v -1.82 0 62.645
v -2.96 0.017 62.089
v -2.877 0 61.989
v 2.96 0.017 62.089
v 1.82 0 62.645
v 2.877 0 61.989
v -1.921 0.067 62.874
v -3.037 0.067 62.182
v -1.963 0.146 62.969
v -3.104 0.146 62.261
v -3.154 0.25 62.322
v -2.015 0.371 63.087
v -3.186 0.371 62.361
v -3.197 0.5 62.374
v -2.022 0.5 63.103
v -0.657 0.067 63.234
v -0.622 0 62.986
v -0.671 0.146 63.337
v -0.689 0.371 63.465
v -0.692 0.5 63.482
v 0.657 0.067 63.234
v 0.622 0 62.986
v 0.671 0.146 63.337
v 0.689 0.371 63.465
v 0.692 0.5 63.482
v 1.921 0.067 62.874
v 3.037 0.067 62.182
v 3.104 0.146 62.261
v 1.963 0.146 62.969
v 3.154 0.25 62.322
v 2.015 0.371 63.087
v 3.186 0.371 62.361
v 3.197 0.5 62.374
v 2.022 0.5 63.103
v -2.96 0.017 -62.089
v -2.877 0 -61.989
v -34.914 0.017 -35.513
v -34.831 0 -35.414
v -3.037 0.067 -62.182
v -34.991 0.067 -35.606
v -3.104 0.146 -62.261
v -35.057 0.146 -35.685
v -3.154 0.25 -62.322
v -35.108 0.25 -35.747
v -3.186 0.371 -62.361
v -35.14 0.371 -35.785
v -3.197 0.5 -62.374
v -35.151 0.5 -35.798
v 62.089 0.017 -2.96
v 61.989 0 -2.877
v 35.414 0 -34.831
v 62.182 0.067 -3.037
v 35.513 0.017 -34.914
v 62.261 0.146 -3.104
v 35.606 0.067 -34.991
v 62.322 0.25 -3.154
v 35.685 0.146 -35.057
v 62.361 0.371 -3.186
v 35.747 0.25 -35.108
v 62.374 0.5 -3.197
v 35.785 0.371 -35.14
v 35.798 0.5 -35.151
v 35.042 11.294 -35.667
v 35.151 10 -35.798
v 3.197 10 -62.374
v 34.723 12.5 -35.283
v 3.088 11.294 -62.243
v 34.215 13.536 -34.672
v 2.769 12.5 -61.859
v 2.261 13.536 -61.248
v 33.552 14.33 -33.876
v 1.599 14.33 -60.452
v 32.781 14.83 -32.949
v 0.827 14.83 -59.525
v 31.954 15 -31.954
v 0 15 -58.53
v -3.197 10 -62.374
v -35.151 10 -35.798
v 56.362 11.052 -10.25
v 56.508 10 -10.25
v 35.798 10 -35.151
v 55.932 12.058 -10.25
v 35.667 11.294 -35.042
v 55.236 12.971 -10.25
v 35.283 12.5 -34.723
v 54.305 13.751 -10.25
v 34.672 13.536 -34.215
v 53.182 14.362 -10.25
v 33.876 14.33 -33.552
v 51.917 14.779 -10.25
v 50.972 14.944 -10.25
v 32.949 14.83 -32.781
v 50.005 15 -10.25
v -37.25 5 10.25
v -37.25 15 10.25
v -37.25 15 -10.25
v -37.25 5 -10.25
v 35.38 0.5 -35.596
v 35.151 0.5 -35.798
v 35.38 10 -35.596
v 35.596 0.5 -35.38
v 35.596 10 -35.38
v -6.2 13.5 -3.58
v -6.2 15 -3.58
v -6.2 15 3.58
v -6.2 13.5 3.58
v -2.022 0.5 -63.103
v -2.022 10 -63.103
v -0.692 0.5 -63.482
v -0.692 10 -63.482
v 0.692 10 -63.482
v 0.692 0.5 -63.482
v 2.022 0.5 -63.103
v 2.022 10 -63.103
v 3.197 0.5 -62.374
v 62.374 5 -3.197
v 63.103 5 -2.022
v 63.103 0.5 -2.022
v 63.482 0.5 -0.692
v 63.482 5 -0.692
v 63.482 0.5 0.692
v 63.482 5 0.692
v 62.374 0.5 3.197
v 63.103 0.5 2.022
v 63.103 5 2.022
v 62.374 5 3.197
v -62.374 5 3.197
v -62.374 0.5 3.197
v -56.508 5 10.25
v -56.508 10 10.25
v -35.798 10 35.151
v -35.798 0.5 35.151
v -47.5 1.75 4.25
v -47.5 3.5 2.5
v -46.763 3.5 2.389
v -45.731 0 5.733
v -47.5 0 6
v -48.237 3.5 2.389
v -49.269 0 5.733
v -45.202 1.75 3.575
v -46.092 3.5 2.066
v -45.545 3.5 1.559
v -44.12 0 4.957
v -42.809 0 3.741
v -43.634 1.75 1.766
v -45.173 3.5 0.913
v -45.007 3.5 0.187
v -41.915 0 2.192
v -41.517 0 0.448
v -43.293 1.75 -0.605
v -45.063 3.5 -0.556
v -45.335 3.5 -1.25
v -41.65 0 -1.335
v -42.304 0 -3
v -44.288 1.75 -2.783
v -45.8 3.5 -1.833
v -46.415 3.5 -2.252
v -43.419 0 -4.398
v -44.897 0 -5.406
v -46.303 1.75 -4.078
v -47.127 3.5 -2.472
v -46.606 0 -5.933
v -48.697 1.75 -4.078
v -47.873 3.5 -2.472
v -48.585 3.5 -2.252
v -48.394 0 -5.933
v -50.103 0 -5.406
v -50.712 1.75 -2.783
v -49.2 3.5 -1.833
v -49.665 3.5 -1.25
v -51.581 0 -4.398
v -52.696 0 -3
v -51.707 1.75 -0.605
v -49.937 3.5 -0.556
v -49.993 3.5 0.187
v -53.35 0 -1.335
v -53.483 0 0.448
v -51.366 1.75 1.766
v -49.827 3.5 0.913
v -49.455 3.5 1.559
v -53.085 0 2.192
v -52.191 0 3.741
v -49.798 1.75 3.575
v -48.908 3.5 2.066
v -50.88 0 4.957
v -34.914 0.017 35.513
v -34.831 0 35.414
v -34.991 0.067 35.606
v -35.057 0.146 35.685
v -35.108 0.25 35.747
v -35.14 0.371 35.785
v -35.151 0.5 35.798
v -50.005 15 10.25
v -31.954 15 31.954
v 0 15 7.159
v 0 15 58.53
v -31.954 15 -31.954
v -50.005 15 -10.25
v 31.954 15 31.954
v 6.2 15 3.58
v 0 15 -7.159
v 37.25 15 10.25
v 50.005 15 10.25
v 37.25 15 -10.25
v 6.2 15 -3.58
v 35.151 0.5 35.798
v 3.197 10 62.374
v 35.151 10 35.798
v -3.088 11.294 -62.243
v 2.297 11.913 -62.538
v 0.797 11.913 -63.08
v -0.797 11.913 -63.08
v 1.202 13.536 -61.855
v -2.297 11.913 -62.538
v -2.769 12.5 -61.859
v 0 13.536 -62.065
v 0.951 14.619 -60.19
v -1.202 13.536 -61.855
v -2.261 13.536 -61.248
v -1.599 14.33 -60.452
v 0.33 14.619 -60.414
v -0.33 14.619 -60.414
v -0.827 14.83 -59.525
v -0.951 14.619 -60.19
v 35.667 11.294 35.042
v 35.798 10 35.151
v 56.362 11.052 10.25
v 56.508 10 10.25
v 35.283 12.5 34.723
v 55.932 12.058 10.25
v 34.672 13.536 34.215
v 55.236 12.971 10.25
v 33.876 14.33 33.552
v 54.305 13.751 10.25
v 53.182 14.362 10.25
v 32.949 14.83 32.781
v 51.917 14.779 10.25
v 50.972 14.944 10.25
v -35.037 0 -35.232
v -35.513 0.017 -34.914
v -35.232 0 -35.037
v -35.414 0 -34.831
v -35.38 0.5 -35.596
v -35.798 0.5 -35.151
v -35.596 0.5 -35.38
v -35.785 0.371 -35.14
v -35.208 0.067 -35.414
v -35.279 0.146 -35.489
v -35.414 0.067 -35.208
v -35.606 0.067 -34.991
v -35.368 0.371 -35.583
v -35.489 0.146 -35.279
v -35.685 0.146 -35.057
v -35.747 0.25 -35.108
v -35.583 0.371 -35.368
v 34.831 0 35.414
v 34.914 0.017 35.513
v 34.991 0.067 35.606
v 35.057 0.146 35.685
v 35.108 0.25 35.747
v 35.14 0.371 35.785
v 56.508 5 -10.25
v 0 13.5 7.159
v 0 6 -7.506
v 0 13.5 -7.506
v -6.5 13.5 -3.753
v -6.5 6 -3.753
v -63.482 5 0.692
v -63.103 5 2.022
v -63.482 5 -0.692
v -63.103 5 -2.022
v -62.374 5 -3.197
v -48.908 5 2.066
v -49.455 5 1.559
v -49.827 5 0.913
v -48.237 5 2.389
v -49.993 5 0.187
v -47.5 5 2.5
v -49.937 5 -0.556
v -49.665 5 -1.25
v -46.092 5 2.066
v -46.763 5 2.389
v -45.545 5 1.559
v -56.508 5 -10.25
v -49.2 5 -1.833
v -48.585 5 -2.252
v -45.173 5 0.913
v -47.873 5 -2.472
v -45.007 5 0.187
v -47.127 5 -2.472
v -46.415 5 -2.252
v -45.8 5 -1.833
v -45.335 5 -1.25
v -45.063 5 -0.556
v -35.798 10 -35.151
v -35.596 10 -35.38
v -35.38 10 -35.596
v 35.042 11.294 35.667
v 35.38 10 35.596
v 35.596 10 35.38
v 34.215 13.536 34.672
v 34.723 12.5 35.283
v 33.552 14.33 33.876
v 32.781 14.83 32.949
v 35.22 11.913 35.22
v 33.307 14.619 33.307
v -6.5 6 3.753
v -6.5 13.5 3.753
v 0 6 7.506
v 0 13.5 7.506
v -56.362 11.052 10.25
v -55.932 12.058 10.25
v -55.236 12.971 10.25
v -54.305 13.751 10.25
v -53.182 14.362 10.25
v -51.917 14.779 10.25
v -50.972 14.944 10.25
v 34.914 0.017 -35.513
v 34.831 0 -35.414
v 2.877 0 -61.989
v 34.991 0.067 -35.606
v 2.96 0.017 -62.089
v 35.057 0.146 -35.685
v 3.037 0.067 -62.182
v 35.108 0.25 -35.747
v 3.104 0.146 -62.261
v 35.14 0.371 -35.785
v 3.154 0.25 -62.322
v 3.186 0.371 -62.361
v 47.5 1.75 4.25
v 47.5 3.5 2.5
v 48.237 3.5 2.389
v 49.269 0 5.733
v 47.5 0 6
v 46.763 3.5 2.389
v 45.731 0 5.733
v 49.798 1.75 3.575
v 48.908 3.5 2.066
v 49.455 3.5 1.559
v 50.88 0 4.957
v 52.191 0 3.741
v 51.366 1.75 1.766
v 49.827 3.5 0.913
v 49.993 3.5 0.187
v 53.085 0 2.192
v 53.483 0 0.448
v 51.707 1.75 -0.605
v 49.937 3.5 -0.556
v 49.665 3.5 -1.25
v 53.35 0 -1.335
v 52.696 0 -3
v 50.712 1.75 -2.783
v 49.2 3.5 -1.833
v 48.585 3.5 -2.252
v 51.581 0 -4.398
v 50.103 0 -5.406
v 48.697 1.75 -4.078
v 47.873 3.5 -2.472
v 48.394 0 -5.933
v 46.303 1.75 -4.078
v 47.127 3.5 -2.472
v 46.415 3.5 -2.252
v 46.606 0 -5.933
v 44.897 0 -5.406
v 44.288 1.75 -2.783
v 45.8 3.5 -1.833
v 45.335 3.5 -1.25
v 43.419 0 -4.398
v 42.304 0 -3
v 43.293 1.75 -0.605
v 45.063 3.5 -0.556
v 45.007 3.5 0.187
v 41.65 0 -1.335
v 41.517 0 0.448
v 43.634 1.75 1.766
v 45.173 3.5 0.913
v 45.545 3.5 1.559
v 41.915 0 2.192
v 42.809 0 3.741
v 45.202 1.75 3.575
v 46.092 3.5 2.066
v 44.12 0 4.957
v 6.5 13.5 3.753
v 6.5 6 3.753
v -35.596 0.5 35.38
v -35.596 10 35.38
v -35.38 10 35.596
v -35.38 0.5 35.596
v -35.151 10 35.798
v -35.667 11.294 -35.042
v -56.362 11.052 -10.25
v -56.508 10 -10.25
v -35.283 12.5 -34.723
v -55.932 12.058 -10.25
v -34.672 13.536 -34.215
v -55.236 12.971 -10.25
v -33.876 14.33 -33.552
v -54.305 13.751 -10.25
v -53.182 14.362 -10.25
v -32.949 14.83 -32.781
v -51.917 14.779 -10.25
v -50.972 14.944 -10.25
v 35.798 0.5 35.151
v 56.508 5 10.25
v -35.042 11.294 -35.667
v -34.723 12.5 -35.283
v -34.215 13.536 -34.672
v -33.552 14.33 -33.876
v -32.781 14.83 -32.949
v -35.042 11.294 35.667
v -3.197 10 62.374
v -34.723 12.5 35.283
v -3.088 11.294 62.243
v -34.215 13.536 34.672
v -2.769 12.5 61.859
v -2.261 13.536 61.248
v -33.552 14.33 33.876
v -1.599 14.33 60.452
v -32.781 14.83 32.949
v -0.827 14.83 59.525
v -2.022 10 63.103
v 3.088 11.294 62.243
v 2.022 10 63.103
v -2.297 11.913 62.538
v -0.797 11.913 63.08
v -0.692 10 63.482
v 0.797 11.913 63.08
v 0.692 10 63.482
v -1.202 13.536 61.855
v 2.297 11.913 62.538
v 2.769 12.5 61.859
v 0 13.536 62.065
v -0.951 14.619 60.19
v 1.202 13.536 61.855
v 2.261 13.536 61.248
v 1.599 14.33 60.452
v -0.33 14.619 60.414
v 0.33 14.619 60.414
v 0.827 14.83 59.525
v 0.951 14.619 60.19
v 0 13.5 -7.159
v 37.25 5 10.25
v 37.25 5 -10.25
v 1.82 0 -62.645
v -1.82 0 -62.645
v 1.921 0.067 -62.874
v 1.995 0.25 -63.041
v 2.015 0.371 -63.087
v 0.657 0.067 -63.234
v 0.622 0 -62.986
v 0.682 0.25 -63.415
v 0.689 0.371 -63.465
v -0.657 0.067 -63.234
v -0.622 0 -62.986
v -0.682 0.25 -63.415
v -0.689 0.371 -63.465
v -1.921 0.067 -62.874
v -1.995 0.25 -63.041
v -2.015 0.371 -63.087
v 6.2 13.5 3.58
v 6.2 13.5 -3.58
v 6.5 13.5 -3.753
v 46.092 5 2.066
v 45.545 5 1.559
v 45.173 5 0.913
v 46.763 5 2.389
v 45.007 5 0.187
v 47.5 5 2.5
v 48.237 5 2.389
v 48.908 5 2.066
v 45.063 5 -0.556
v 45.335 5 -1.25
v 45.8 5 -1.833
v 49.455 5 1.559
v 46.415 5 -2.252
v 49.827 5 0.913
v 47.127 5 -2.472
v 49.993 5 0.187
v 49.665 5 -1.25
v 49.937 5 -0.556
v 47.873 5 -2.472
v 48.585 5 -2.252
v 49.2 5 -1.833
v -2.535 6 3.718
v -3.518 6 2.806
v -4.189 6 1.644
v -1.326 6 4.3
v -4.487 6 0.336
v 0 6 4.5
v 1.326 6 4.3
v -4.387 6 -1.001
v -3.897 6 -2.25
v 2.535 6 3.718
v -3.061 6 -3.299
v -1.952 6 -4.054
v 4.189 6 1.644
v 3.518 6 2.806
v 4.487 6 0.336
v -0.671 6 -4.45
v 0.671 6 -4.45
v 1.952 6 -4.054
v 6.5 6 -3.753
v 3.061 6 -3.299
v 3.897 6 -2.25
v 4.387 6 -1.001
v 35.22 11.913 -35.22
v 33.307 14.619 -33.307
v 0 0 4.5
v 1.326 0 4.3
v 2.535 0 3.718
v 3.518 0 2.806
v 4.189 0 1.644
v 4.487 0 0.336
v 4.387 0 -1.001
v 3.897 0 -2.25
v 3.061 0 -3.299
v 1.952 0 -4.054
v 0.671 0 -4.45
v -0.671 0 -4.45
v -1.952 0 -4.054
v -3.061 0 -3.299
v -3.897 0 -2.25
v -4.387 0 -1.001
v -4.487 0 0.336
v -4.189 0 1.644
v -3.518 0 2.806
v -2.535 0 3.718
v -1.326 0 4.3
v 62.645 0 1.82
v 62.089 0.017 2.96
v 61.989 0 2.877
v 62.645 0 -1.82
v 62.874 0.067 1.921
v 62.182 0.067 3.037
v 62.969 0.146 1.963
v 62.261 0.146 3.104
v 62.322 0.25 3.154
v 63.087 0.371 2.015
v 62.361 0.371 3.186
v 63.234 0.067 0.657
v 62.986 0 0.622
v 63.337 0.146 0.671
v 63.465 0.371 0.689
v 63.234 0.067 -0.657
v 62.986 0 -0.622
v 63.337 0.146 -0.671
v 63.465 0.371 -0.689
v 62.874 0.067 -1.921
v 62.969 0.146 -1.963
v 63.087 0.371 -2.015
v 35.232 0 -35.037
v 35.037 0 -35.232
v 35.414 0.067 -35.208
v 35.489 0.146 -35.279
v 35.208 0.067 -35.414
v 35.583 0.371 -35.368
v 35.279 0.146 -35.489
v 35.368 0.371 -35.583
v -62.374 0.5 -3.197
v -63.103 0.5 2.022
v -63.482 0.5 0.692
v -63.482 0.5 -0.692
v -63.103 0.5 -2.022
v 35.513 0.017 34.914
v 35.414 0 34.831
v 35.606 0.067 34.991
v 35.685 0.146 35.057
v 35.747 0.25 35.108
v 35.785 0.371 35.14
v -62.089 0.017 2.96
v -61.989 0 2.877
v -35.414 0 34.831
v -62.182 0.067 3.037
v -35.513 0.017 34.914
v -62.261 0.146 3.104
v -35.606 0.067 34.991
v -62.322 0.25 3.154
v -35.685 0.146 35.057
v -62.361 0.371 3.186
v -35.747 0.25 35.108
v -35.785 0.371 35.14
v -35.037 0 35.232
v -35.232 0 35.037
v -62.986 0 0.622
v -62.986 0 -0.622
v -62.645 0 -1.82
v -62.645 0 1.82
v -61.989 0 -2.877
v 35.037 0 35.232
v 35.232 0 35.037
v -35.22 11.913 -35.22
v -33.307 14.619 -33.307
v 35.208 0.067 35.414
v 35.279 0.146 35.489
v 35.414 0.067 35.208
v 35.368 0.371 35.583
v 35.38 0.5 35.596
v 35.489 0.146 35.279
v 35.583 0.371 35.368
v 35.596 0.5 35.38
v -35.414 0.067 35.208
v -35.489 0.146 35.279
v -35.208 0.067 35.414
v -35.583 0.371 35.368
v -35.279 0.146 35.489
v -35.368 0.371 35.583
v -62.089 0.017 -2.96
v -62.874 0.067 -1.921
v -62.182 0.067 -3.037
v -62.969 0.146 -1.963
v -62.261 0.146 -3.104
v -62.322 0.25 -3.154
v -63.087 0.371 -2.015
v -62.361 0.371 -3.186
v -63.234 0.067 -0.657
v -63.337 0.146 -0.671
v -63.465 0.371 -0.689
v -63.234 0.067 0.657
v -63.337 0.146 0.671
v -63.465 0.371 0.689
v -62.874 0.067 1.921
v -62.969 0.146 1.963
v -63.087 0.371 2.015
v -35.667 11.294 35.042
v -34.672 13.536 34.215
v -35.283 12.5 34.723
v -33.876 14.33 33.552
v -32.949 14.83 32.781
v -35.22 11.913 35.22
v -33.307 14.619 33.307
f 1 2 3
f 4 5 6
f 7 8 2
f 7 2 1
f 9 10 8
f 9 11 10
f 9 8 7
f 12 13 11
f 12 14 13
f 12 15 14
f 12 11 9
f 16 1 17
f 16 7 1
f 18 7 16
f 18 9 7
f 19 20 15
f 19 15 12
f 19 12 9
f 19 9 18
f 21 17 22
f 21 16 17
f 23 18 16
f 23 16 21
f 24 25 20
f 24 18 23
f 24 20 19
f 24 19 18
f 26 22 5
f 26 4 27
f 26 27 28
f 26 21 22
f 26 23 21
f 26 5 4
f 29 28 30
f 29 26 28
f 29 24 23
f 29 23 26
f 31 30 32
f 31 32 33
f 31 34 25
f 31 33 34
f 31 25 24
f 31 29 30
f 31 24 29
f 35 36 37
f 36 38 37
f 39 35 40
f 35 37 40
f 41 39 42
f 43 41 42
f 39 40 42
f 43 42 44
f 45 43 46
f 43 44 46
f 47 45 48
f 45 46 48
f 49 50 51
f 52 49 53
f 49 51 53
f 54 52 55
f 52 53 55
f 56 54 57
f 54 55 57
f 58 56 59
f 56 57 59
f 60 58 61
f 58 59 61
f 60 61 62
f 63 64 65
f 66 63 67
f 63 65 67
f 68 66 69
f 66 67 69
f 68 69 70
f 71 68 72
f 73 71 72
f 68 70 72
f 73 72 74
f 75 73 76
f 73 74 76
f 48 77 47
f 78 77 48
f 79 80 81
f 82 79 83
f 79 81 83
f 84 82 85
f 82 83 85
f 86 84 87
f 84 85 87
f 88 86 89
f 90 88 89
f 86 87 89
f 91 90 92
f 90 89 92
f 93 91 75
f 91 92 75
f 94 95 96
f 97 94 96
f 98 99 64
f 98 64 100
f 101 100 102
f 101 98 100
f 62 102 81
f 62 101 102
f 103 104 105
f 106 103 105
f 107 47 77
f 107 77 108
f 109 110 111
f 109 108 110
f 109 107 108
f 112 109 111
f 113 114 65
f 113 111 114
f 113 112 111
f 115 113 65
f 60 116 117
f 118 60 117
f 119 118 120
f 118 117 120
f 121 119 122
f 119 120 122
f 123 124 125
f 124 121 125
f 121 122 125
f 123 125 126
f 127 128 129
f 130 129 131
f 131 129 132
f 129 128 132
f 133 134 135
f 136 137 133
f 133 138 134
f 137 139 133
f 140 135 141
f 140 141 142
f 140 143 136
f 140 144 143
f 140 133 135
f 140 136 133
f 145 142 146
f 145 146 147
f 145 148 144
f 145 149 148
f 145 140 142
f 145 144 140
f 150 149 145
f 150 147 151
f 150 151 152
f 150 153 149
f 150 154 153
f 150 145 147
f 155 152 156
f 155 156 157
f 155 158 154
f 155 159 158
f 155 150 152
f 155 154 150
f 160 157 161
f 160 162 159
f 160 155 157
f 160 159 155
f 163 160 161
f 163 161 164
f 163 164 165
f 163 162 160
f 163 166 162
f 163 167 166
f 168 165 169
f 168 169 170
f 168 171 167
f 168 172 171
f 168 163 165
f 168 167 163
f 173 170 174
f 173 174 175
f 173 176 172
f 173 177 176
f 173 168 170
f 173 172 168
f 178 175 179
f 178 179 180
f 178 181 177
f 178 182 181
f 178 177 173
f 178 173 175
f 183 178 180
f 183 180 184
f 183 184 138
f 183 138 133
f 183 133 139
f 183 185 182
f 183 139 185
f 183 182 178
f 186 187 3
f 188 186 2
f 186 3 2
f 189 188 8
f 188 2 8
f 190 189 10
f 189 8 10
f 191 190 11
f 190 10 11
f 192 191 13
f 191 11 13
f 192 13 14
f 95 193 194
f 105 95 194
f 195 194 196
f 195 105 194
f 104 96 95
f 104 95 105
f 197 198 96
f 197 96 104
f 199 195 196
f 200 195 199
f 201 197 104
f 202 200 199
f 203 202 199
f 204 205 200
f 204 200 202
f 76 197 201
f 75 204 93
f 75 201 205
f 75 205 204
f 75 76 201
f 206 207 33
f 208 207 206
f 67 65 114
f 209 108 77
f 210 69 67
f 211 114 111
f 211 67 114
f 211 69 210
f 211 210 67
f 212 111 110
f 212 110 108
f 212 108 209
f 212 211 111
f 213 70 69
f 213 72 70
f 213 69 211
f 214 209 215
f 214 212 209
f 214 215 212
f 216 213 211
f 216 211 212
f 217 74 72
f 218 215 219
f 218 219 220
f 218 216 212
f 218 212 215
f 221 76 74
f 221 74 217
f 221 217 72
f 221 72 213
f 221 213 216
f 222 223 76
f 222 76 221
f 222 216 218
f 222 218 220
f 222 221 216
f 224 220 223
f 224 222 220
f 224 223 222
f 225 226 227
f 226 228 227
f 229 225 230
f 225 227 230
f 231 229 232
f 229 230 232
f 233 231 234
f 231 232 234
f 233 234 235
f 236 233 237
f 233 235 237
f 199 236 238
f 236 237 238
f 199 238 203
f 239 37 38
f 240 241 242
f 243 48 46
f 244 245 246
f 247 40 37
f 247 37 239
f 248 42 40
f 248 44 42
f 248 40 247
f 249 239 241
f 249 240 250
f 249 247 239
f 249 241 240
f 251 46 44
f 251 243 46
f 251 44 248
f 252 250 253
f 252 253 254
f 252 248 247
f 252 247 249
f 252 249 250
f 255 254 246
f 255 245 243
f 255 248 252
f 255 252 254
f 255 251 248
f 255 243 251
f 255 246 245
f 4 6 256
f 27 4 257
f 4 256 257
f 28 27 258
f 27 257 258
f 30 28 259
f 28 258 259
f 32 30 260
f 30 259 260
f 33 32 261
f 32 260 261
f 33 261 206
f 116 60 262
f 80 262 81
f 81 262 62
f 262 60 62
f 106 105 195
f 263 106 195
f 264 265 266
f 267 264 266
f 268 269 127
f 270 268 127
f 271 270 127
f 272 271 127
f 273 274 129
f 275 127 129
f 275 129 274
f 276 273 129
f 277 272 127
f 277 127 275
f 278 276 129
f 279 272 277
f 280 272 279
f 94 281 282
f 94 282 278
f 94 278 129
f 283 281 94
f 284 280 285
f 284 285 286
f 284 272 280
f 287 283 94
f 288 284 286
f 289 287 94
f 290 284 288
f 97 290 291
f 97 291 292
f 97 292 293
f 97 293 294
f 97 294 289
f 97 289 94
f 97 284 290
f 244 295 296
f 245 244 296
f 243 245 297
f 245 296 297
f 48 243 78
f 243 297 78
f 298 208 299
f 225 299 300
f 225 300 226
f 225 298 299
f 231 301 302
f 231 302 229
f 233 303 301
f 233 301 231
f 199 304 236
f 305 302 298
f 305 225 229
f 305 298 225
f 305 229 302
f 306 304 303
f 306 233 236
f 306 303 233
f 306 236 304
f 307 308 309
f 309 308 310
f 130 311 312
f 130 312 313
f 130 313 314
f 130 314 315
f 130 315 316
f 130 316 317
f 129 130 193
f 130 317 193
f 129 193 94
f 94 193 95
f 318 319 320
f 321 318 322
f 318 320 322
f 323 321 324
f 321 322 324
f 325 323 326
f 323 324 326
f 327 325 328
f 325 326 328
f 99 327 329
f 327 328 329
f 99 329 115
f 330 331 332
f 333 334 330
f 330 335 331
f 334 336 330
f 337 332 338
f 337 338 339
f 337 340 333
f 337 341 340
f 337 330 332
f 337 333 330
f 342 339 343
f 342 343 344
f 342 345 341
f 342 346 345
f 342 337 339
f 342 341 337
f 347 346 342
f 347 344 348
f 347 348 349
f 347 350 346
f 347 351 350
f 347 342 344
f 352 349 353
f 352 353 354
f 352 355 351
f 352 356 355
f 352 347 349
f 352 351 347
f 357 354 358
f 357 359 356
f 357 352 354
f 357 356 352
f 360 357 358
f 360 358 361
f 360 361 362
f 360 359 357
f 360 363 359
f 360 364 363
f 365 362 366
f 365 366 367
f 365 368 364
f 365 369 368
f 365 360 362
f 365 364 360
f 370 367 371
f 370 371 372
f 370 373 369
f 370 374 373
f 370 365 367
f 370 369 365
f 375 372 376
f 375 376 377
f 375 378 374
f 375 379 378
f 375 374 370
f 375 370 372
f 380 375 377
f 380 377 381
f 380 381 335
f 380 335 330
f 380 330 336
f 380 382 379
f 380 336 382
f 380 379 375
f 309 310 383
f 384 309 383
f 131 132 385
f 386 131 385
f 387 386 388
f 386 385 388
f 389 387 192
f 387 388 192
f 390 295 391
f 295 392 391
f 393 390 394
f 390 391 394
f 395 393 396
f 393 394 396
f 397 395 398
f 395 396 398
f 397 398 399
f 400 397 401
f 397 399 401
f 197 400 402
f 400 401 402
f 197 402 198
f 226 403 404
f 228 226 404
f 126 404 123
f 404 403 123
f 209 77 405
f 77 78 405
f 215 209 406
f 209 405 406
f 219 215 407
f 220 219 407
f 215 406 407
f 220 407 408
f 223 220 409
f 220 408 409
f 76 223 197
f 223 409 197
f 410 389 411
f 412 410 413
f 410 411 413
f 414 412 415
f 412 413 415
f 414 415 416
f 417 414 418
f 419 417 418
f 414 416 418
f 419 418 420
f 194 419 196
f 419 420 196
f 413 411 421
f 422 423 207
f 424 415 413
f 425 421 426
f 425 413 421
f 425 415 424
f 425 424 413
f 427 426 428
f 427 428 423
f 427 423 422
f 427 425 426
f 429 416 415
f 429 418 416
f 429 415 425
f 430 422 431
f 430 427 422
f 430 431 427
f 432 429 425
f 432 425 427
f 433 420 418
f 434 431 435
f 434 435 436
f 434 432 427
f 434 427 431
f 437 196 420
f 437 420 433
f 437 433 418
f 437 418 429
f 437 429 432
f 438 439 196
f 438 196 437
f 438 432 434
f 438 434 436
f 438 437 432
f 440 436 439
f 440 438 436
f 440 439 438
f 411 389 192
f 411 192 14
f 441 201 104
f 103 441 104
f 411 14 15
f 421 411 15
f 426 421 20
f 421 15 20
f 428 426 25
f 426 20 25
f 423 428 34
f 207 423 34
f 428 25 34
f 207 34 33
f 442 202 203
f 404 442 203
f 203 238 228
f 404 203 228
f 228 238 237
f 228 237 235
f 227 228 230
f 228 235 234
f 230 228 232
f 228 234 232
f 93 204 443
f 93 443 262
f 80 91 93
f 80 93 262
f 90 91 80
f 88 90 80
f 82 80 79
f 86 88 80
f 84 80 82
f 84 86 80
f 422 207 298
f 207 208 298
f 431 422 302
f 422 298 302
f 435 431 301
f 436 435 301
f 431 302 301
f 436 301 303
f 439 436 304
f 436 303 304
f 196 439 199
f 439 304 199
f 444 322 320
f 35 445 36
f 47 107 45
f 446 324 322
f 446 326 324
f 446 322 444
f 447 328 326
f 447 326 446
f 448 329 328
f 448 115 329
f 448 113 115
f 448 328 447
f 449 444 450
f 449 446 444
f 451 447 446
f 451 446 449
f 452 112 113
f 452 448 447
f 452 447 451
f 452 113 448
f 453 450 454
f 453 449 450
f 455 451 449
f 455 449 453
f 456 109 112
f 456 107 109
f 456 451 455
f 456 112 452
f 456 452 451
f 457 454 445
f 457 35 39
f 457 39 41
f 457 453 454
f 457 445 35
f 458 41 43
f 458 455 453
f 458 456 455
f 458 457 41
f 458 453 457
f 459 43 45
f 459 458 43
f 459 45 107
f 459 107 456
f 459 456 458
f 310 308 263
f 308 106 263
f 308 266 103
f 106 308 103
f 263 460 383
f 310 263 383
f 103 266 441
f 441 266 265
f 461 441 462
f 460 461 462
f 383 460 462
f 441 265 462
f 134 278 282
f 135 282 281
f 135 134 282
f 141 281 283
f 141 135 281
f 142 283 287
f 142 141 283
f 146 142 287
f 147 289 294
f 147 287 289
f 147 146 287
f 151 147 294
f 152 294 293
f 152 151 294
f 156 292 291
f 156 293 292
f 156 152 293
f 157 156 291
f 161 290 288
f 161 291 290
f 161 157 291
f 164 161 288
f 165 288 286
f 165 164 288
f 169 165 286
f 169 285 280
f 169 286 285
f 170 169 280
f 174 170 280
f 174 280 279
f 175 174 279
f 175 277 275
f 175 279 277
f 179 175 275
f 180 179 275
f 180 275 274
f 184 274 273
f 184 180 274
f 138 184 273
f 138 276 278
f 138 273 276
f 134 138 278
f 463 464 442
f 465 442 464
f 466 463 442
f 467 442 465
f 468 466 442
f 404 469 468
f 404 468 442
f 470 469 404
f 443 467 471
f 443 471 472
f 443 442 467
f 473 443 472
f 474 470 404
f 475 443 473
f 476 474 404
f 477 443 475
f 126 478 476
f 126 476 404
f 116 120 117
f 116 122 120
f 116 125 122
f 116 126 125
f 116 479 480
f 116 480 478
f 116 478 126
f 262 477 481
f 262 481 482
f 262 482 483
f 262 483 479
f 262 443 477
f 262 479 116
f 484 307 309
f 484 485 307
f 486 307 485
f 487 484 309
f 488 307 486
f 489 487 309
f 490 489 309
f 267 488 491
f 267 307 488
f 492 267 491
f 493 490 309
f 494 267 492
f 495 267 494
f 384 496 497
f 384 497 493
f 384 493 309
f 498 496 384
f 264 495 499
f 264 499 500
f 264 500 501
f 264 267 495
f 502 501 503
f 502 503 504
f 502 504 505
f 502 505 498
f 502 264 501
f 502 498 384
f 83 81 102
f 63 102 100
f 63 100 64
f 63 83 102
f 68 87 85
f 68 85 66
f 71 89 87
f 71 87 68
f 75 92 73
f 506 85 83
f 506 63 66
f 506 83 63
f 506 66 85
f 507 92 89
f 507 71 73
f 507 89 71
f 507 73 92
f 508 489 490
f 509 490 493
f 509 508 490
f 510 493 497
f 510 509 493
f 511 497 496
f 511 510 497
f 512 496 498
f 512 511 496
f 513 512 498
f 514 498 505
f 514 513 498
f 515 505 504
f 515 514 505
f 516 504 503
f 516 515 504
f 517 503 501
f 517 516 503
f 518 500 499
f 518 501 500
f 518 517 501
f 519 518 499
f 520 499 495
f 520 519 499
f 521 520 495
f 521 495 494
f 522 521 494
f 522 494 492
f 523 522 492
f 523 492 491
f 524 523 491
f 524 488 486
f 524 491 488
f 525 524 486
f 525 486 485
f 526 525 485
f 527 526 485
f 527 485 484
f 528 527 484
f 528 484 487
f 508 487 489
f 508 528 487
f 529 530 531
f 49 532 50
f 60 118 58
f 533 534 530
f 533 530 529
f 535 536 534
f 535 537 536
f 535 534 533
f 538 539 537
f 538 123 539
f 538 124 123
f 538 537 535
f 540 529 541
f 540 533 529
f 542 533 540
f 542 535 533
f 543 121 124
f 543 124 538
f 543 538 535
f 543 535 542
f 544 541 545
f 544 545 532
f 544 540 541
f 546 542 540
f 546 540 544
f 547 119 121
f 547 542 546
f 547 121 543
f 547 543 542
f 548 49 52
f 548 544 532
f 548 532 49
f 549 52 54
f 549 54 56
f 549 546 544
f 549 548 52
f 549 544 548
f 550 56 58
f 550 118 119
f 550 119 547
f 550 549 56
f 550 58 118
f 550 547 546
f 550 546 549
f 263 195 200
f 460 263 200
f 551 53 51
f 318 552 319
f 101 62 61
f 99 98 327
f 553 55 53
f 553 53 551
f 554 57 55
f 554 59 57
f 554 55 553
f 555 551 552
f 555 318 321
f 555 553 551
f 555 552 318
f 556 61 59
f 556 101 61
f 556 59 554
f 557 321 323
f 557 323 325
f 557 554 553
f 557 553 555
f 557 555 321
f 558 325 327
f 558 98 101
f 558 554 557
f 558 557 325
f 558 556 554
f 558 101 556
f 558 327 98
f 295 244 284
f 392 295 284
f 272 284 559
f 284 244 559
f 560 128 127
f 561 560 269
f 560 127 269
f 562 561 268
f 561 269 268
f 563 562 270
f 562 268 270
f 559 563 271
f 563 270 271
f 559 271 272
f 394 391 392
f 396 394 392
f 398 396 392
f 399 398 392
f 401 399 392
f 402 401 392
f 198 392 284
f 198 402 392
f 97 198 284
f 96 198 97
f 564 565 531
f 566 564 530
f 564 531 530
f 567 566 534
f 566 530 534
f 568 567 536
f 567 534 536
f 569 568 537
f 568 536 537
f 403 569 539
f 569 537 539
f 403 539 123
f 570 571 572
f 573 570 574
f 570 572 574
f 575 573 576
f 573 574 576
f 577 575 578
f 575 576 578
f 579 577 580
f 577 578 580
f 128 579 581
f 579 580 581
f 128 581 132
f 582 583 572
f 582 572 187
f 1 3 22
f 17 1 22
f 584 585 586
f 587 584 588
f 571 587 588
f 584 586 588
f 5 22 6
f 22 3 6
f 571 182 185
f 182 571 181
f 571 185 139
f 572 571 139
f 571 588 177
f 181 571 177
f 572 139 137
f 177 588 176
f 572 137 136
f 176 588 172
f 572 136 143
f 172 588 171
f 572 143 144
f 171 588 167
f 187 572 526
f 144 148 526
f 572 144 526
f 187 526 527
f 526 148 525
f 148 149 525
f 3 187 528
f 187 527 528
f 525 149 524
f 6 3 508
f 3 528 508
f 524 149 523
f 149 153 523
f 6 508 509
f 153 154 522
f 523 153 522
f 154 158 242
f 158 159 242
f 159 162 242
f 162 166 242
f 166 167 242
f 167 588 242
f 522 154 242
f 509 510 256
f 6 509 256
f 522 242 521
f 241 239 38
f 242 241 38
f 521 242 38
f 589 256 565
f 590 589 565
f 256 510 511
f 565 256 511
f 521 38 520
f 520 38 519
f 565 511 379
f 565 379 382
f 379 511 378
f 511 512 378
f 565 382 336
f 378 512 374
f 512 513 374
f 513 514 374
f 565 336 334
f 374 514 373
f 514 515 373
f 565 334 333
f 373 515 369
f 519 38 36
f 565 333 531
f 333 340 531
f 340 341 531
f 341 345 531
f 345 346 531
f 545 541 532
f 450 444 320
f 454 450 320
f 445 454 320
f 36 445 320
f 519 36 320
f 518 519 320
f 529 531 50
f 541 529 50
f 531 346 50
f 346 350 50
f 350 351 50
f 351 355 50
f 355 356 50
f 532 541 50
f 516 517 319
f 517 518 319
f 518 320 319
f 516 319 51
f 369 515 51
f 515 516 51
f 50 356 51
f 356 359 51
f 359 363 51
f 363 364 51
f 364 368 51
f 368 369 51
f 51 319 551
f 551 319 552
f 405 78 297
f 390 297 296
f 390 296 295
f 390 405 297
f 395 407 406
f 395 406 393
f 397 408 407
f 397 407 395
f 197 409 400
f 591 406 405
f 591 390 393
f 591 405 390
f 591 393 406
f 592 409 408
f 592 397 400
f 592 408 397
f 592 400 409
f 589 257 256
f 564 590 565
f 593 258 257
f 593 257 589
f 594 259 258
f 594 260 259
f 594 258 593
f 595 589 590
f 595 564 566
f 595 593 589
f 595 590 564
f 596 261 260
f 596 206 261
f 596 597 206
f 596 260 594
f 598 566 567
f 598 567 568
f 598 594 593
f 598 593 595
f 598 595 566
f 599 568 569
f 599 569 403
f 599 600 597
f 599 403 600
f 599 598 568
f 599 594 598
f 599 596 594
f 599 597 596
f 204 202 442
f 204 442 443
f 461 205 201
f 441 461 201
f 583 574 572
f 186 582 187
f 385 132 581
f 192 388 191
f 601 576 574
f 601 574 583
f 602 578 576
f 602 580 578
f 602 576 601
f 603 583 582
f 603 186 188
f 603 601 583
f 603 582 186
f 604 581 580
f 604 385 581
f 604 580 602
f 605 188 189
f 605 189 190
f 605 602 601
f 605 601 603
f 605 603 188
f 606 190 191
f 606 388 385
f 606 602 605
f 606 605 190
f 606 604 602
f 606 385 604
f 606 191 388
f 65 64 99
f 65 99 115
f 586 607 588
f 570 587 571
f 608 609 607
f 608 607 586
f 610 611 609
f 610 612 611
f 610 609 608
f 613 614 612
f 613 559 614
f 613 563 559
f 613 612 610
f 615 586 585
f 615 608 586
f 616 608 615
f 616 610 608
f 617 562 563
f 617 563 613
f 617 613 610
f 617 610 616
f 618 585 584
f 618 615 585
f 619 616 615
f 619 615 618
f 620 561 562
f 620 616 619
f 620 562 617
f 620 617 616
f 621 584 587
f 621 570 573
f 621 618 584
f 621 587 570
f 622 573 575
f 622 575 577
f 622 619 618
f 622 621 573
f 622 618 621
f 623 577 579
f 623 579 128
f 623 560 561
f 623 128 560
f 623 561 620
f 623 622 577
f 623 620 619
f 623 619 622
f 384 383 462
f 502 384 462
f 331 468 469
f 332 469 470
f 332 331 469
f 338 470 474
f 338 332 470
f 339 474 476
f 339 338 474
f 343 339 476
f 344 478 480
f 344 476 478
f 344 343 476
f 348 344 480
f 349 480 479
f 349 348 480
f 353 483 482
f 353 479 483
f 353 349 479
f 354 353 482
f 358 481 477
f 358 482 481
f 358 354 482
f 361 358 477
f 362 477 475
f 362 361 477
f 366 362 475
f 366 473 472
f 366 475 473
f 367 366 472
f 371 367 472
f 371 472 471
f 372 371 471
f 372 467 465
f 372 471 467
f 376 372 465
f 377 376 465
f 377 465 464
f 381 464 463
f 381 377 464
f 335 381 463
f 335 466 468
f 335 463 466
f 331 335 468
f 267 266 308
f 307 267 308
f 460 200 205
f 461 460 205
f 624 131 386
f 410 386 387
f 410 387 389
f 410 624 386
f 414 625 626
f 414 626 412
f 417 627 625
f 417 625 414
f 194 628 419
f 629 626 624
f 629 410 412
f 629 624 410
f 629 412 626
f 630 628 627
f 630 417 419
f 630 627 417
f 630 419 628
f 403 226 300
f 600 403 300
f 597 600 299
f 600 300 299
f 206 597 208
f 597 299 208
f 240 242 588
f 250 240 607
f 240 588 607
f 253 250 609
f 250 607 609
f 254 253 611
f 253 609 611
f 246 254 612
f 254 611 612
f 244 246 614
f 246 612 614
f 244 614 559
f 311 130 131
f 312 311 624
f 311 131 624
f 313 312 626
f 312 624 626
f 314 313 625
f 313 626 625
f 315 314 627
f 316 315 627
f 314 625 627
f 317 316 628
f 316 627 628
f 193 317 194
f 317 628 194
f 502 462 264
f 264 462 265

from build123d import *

# Parameters (mm, degrees)
ESQUISSE1_R             = 4.5
ESQUISSE1_R_2           = 2.5
BOSS_EXTRU_1_DEPTH      = 15
ESQUISSE2_OUTSIDE_W     = 172.858
ESQUISSE2_OUTSIDE_H     = 199.18
ENL_V_MAT_EXTRU_1_DEPTH = 103.80323738
CONG_1_R                = 5
ENL_V_MAT_EXTRU_2_DEPTH = 9
ESQUISSE3_W             = 26.279593634
ESQUISSE3_H             = 20.5
ENL_V_MAT_EXTRU_3_DEPTH = 10
CONG_2_R                = 5
CONG_3_R                = 0.5
ESQUISSE5_R             = 7.505553499
BOSS_EXTRU_2_DEPTH      = 1.5
CHANFREIN1_SIZE         = 3.5


with BuildPart() as part:
    # Esquisse1 → Boss.-Extru.1 (new body)
    with BuildSketch(Plane(origin=(0, 0, 0), x_dir=(1, 0, 0), z_dir=(0, 1, 0))):
        Polygon((-65.032881815, 0), (0, -78.193541284), (65.032881815, 0), (0, 78.193541284), align=None)
        with Locations(Location((0, 0, 0), (0, 0, 270))):
            Circle(ESQUISSE1_R, mode=Mode.SUBTRACT)
        with Locations(Location((-47.5, 0, 0), (0, 0, 270))):
            Circle(ESQUISSE1_R_2, mode=Mode.SUBTRACT)
        with Locations(Location((47.5, 0, 0), (0, 0, 270))):
            Circle(ESQUISSE1_R_2, mode=Mode.SUBTRACT)
    extrude(amount=BOSS_EXTRU_1_DEPTH)

    # Esquisse2 outside → Enlèv. mat.-Extru.1 (cut, through all)
    with BuildSketch(Plane(origin=(0, 15, 0), x_dir=(1, 0, 0), z_dir=(0, 1, 0))):
        Rectangle(ESQUISSE2_OUTSIDE_W, ESQUISSE2_OUTSIDE_H)
        Polygon((0, 65.032881815), (-78.193541284, 0), (0, -65.032881815), (78.193541284, 0), align=None, mode=Mode.SUBTRACT)
    extrude(amount=-ENL_V_MAT_EXTRU_1_DEPTH, mode=Mode.SUBTRACT)

    # Congé1
    cong_1_edges = [part.edges().sort_by_distance(p)[0] for p in [
        (35.504282094, 7.5, -35.504282094),
        (35.504282094, 7.5, 35.504282094),
        (-35.504282094, 7.5, 35.504282094),
        (-35.504282094, 7.5, -35.504282094),
        (0, 7.5, -65.032881815),
        (0, 7.5, 65.032881815),
        (65.032881815, 7.5, 0),
        (-65.032881815, 7.5, 0),
    ]]
    fillet(cong_1_edges, radius=CONG_1_R)

    # Esquisse4 → Enlèv. mat.-Extru.2 (cut)
    with BuildSketch(Plane(origin=(0, 15, 0), x_dir=(1, 0, 0), z_dir=(0, 1, 0))):
        Polygon((6.5, 3.75277675), (0, 7.505553499), (-6.5, 3.75277675), (-6.5, -3.75277675), (0, -7.505553499), (6.5, -3.75277675), align=None)
    extrude(amount=-ENL_V_MAT_EXTRU_2_DEPTH, mode=Mode.SUBTRACT)

    # Esquisse3 → Enlèv. mat.-Extru.3 (cut)
    with BuildSketch(Plane(origin=(0, 15, 0), x_dir=(1, 0, 0), z_dir=(0, 1, 0))):
        with Locations((-50.389796817, 0)):
            Rectangle(ESQUISSE3_W, ESQUISSE3_H)
        with Locations((50.389796817, 0)):
            Rectangle(ESQUISSE3_W, ESQUISSE3_H)
    extrude(amount=-ENL_V_MAT_EXTRU_3_DEPTH, mode=Mode.SUBTRACT)

    # Congé2
    cong_2_edges = [part.edges().sort_by_distance(p)[0] for p in [
        (46.153054923, 15, -22.700524447),
        (-46.153054923, 15, 22.700524447),
        (-19.174121952, 15, -49.08593292),
        (19.174121952, 15, 49.08593292),
        (46.153054923, 15, 22.700524447),
        (19.174121952, 15, -49.08593292),
        (-46.153054923, 15, -22.700524447),
        (-19.174121952, 15, 49.08593292),
        (0, 15, -63.529593634),
        (0, 15, 63.529593634),
        (-35.489387791, 15, 35.489387791),
        (35.489387791, 15, 35.489387791),
        (35.489387791, 15, -35.489387791),
        (-35.489387791, 15, -35.489387791),
    ]]
    fillet(cong_2_edges, radius=CONG_2_R)

    # Congé3
    cong_3_edges = [part.edges().sort_by_distance(p)[0] for p in [
        (-19.174121952, 0, -49.08593292),
        (-49.08593292, 0, -19.174121952),
        (49.08593292, 0, 19.174121952),
        (19.174121952, 0, 49.08593292),
        (-19.174121952, 0, 49.08593292),
        (-49.08593292, 0, 19.174121952),
        (19.174121952, 0, -49.08593292),
        (49.08593292, 0, -19.174121952),
        (-63.529593634, 0, 0),
        (63.529593634, 0, 0),
        (0, 0, -63.529593634),
        (0, 0, 63.529593634),
        (-35.489387791, 0, 35.489387791),
        (35.489387791, 0, 35.489387791),
        (35.489387791, 0, -35.489387791),
        (-35.489387791, 0, -35.489387791),
    ]]
    fillet(cong_3_edges, radius=CONG_3_R)

    # Esquisse5 → Boss.-Extru.2 (add)
    with BuildSketch(Plane(origin=(0, 15, 0), x_dir=(1, 0, 0), z_dir=(0, 1, 0))):
        Circle(ESQUISSE5_R)
        Polygon((6.2, 3.579571669), (0, 7.159143338), (-6.2, 3.579571669), (-6.2, -3.579571669), (0, -7.159143338), (6.2, -3.579571669), align=None, mode=Mode.SUBTRACT)
    extrude(amount=-BOSS_EXTRU_2_DEPTH)

    # Chanfrein1
    chanfrein1_edges = [part.edges().sort_by_distance(p)[0] for p in [
        (-47.5, 0, -2.5),
        (47.5, 0, -2.5),
    ]]
    chamfer(chanfrein1_edges, length=CHANFREIN1_SIZE)


solid = part.part
